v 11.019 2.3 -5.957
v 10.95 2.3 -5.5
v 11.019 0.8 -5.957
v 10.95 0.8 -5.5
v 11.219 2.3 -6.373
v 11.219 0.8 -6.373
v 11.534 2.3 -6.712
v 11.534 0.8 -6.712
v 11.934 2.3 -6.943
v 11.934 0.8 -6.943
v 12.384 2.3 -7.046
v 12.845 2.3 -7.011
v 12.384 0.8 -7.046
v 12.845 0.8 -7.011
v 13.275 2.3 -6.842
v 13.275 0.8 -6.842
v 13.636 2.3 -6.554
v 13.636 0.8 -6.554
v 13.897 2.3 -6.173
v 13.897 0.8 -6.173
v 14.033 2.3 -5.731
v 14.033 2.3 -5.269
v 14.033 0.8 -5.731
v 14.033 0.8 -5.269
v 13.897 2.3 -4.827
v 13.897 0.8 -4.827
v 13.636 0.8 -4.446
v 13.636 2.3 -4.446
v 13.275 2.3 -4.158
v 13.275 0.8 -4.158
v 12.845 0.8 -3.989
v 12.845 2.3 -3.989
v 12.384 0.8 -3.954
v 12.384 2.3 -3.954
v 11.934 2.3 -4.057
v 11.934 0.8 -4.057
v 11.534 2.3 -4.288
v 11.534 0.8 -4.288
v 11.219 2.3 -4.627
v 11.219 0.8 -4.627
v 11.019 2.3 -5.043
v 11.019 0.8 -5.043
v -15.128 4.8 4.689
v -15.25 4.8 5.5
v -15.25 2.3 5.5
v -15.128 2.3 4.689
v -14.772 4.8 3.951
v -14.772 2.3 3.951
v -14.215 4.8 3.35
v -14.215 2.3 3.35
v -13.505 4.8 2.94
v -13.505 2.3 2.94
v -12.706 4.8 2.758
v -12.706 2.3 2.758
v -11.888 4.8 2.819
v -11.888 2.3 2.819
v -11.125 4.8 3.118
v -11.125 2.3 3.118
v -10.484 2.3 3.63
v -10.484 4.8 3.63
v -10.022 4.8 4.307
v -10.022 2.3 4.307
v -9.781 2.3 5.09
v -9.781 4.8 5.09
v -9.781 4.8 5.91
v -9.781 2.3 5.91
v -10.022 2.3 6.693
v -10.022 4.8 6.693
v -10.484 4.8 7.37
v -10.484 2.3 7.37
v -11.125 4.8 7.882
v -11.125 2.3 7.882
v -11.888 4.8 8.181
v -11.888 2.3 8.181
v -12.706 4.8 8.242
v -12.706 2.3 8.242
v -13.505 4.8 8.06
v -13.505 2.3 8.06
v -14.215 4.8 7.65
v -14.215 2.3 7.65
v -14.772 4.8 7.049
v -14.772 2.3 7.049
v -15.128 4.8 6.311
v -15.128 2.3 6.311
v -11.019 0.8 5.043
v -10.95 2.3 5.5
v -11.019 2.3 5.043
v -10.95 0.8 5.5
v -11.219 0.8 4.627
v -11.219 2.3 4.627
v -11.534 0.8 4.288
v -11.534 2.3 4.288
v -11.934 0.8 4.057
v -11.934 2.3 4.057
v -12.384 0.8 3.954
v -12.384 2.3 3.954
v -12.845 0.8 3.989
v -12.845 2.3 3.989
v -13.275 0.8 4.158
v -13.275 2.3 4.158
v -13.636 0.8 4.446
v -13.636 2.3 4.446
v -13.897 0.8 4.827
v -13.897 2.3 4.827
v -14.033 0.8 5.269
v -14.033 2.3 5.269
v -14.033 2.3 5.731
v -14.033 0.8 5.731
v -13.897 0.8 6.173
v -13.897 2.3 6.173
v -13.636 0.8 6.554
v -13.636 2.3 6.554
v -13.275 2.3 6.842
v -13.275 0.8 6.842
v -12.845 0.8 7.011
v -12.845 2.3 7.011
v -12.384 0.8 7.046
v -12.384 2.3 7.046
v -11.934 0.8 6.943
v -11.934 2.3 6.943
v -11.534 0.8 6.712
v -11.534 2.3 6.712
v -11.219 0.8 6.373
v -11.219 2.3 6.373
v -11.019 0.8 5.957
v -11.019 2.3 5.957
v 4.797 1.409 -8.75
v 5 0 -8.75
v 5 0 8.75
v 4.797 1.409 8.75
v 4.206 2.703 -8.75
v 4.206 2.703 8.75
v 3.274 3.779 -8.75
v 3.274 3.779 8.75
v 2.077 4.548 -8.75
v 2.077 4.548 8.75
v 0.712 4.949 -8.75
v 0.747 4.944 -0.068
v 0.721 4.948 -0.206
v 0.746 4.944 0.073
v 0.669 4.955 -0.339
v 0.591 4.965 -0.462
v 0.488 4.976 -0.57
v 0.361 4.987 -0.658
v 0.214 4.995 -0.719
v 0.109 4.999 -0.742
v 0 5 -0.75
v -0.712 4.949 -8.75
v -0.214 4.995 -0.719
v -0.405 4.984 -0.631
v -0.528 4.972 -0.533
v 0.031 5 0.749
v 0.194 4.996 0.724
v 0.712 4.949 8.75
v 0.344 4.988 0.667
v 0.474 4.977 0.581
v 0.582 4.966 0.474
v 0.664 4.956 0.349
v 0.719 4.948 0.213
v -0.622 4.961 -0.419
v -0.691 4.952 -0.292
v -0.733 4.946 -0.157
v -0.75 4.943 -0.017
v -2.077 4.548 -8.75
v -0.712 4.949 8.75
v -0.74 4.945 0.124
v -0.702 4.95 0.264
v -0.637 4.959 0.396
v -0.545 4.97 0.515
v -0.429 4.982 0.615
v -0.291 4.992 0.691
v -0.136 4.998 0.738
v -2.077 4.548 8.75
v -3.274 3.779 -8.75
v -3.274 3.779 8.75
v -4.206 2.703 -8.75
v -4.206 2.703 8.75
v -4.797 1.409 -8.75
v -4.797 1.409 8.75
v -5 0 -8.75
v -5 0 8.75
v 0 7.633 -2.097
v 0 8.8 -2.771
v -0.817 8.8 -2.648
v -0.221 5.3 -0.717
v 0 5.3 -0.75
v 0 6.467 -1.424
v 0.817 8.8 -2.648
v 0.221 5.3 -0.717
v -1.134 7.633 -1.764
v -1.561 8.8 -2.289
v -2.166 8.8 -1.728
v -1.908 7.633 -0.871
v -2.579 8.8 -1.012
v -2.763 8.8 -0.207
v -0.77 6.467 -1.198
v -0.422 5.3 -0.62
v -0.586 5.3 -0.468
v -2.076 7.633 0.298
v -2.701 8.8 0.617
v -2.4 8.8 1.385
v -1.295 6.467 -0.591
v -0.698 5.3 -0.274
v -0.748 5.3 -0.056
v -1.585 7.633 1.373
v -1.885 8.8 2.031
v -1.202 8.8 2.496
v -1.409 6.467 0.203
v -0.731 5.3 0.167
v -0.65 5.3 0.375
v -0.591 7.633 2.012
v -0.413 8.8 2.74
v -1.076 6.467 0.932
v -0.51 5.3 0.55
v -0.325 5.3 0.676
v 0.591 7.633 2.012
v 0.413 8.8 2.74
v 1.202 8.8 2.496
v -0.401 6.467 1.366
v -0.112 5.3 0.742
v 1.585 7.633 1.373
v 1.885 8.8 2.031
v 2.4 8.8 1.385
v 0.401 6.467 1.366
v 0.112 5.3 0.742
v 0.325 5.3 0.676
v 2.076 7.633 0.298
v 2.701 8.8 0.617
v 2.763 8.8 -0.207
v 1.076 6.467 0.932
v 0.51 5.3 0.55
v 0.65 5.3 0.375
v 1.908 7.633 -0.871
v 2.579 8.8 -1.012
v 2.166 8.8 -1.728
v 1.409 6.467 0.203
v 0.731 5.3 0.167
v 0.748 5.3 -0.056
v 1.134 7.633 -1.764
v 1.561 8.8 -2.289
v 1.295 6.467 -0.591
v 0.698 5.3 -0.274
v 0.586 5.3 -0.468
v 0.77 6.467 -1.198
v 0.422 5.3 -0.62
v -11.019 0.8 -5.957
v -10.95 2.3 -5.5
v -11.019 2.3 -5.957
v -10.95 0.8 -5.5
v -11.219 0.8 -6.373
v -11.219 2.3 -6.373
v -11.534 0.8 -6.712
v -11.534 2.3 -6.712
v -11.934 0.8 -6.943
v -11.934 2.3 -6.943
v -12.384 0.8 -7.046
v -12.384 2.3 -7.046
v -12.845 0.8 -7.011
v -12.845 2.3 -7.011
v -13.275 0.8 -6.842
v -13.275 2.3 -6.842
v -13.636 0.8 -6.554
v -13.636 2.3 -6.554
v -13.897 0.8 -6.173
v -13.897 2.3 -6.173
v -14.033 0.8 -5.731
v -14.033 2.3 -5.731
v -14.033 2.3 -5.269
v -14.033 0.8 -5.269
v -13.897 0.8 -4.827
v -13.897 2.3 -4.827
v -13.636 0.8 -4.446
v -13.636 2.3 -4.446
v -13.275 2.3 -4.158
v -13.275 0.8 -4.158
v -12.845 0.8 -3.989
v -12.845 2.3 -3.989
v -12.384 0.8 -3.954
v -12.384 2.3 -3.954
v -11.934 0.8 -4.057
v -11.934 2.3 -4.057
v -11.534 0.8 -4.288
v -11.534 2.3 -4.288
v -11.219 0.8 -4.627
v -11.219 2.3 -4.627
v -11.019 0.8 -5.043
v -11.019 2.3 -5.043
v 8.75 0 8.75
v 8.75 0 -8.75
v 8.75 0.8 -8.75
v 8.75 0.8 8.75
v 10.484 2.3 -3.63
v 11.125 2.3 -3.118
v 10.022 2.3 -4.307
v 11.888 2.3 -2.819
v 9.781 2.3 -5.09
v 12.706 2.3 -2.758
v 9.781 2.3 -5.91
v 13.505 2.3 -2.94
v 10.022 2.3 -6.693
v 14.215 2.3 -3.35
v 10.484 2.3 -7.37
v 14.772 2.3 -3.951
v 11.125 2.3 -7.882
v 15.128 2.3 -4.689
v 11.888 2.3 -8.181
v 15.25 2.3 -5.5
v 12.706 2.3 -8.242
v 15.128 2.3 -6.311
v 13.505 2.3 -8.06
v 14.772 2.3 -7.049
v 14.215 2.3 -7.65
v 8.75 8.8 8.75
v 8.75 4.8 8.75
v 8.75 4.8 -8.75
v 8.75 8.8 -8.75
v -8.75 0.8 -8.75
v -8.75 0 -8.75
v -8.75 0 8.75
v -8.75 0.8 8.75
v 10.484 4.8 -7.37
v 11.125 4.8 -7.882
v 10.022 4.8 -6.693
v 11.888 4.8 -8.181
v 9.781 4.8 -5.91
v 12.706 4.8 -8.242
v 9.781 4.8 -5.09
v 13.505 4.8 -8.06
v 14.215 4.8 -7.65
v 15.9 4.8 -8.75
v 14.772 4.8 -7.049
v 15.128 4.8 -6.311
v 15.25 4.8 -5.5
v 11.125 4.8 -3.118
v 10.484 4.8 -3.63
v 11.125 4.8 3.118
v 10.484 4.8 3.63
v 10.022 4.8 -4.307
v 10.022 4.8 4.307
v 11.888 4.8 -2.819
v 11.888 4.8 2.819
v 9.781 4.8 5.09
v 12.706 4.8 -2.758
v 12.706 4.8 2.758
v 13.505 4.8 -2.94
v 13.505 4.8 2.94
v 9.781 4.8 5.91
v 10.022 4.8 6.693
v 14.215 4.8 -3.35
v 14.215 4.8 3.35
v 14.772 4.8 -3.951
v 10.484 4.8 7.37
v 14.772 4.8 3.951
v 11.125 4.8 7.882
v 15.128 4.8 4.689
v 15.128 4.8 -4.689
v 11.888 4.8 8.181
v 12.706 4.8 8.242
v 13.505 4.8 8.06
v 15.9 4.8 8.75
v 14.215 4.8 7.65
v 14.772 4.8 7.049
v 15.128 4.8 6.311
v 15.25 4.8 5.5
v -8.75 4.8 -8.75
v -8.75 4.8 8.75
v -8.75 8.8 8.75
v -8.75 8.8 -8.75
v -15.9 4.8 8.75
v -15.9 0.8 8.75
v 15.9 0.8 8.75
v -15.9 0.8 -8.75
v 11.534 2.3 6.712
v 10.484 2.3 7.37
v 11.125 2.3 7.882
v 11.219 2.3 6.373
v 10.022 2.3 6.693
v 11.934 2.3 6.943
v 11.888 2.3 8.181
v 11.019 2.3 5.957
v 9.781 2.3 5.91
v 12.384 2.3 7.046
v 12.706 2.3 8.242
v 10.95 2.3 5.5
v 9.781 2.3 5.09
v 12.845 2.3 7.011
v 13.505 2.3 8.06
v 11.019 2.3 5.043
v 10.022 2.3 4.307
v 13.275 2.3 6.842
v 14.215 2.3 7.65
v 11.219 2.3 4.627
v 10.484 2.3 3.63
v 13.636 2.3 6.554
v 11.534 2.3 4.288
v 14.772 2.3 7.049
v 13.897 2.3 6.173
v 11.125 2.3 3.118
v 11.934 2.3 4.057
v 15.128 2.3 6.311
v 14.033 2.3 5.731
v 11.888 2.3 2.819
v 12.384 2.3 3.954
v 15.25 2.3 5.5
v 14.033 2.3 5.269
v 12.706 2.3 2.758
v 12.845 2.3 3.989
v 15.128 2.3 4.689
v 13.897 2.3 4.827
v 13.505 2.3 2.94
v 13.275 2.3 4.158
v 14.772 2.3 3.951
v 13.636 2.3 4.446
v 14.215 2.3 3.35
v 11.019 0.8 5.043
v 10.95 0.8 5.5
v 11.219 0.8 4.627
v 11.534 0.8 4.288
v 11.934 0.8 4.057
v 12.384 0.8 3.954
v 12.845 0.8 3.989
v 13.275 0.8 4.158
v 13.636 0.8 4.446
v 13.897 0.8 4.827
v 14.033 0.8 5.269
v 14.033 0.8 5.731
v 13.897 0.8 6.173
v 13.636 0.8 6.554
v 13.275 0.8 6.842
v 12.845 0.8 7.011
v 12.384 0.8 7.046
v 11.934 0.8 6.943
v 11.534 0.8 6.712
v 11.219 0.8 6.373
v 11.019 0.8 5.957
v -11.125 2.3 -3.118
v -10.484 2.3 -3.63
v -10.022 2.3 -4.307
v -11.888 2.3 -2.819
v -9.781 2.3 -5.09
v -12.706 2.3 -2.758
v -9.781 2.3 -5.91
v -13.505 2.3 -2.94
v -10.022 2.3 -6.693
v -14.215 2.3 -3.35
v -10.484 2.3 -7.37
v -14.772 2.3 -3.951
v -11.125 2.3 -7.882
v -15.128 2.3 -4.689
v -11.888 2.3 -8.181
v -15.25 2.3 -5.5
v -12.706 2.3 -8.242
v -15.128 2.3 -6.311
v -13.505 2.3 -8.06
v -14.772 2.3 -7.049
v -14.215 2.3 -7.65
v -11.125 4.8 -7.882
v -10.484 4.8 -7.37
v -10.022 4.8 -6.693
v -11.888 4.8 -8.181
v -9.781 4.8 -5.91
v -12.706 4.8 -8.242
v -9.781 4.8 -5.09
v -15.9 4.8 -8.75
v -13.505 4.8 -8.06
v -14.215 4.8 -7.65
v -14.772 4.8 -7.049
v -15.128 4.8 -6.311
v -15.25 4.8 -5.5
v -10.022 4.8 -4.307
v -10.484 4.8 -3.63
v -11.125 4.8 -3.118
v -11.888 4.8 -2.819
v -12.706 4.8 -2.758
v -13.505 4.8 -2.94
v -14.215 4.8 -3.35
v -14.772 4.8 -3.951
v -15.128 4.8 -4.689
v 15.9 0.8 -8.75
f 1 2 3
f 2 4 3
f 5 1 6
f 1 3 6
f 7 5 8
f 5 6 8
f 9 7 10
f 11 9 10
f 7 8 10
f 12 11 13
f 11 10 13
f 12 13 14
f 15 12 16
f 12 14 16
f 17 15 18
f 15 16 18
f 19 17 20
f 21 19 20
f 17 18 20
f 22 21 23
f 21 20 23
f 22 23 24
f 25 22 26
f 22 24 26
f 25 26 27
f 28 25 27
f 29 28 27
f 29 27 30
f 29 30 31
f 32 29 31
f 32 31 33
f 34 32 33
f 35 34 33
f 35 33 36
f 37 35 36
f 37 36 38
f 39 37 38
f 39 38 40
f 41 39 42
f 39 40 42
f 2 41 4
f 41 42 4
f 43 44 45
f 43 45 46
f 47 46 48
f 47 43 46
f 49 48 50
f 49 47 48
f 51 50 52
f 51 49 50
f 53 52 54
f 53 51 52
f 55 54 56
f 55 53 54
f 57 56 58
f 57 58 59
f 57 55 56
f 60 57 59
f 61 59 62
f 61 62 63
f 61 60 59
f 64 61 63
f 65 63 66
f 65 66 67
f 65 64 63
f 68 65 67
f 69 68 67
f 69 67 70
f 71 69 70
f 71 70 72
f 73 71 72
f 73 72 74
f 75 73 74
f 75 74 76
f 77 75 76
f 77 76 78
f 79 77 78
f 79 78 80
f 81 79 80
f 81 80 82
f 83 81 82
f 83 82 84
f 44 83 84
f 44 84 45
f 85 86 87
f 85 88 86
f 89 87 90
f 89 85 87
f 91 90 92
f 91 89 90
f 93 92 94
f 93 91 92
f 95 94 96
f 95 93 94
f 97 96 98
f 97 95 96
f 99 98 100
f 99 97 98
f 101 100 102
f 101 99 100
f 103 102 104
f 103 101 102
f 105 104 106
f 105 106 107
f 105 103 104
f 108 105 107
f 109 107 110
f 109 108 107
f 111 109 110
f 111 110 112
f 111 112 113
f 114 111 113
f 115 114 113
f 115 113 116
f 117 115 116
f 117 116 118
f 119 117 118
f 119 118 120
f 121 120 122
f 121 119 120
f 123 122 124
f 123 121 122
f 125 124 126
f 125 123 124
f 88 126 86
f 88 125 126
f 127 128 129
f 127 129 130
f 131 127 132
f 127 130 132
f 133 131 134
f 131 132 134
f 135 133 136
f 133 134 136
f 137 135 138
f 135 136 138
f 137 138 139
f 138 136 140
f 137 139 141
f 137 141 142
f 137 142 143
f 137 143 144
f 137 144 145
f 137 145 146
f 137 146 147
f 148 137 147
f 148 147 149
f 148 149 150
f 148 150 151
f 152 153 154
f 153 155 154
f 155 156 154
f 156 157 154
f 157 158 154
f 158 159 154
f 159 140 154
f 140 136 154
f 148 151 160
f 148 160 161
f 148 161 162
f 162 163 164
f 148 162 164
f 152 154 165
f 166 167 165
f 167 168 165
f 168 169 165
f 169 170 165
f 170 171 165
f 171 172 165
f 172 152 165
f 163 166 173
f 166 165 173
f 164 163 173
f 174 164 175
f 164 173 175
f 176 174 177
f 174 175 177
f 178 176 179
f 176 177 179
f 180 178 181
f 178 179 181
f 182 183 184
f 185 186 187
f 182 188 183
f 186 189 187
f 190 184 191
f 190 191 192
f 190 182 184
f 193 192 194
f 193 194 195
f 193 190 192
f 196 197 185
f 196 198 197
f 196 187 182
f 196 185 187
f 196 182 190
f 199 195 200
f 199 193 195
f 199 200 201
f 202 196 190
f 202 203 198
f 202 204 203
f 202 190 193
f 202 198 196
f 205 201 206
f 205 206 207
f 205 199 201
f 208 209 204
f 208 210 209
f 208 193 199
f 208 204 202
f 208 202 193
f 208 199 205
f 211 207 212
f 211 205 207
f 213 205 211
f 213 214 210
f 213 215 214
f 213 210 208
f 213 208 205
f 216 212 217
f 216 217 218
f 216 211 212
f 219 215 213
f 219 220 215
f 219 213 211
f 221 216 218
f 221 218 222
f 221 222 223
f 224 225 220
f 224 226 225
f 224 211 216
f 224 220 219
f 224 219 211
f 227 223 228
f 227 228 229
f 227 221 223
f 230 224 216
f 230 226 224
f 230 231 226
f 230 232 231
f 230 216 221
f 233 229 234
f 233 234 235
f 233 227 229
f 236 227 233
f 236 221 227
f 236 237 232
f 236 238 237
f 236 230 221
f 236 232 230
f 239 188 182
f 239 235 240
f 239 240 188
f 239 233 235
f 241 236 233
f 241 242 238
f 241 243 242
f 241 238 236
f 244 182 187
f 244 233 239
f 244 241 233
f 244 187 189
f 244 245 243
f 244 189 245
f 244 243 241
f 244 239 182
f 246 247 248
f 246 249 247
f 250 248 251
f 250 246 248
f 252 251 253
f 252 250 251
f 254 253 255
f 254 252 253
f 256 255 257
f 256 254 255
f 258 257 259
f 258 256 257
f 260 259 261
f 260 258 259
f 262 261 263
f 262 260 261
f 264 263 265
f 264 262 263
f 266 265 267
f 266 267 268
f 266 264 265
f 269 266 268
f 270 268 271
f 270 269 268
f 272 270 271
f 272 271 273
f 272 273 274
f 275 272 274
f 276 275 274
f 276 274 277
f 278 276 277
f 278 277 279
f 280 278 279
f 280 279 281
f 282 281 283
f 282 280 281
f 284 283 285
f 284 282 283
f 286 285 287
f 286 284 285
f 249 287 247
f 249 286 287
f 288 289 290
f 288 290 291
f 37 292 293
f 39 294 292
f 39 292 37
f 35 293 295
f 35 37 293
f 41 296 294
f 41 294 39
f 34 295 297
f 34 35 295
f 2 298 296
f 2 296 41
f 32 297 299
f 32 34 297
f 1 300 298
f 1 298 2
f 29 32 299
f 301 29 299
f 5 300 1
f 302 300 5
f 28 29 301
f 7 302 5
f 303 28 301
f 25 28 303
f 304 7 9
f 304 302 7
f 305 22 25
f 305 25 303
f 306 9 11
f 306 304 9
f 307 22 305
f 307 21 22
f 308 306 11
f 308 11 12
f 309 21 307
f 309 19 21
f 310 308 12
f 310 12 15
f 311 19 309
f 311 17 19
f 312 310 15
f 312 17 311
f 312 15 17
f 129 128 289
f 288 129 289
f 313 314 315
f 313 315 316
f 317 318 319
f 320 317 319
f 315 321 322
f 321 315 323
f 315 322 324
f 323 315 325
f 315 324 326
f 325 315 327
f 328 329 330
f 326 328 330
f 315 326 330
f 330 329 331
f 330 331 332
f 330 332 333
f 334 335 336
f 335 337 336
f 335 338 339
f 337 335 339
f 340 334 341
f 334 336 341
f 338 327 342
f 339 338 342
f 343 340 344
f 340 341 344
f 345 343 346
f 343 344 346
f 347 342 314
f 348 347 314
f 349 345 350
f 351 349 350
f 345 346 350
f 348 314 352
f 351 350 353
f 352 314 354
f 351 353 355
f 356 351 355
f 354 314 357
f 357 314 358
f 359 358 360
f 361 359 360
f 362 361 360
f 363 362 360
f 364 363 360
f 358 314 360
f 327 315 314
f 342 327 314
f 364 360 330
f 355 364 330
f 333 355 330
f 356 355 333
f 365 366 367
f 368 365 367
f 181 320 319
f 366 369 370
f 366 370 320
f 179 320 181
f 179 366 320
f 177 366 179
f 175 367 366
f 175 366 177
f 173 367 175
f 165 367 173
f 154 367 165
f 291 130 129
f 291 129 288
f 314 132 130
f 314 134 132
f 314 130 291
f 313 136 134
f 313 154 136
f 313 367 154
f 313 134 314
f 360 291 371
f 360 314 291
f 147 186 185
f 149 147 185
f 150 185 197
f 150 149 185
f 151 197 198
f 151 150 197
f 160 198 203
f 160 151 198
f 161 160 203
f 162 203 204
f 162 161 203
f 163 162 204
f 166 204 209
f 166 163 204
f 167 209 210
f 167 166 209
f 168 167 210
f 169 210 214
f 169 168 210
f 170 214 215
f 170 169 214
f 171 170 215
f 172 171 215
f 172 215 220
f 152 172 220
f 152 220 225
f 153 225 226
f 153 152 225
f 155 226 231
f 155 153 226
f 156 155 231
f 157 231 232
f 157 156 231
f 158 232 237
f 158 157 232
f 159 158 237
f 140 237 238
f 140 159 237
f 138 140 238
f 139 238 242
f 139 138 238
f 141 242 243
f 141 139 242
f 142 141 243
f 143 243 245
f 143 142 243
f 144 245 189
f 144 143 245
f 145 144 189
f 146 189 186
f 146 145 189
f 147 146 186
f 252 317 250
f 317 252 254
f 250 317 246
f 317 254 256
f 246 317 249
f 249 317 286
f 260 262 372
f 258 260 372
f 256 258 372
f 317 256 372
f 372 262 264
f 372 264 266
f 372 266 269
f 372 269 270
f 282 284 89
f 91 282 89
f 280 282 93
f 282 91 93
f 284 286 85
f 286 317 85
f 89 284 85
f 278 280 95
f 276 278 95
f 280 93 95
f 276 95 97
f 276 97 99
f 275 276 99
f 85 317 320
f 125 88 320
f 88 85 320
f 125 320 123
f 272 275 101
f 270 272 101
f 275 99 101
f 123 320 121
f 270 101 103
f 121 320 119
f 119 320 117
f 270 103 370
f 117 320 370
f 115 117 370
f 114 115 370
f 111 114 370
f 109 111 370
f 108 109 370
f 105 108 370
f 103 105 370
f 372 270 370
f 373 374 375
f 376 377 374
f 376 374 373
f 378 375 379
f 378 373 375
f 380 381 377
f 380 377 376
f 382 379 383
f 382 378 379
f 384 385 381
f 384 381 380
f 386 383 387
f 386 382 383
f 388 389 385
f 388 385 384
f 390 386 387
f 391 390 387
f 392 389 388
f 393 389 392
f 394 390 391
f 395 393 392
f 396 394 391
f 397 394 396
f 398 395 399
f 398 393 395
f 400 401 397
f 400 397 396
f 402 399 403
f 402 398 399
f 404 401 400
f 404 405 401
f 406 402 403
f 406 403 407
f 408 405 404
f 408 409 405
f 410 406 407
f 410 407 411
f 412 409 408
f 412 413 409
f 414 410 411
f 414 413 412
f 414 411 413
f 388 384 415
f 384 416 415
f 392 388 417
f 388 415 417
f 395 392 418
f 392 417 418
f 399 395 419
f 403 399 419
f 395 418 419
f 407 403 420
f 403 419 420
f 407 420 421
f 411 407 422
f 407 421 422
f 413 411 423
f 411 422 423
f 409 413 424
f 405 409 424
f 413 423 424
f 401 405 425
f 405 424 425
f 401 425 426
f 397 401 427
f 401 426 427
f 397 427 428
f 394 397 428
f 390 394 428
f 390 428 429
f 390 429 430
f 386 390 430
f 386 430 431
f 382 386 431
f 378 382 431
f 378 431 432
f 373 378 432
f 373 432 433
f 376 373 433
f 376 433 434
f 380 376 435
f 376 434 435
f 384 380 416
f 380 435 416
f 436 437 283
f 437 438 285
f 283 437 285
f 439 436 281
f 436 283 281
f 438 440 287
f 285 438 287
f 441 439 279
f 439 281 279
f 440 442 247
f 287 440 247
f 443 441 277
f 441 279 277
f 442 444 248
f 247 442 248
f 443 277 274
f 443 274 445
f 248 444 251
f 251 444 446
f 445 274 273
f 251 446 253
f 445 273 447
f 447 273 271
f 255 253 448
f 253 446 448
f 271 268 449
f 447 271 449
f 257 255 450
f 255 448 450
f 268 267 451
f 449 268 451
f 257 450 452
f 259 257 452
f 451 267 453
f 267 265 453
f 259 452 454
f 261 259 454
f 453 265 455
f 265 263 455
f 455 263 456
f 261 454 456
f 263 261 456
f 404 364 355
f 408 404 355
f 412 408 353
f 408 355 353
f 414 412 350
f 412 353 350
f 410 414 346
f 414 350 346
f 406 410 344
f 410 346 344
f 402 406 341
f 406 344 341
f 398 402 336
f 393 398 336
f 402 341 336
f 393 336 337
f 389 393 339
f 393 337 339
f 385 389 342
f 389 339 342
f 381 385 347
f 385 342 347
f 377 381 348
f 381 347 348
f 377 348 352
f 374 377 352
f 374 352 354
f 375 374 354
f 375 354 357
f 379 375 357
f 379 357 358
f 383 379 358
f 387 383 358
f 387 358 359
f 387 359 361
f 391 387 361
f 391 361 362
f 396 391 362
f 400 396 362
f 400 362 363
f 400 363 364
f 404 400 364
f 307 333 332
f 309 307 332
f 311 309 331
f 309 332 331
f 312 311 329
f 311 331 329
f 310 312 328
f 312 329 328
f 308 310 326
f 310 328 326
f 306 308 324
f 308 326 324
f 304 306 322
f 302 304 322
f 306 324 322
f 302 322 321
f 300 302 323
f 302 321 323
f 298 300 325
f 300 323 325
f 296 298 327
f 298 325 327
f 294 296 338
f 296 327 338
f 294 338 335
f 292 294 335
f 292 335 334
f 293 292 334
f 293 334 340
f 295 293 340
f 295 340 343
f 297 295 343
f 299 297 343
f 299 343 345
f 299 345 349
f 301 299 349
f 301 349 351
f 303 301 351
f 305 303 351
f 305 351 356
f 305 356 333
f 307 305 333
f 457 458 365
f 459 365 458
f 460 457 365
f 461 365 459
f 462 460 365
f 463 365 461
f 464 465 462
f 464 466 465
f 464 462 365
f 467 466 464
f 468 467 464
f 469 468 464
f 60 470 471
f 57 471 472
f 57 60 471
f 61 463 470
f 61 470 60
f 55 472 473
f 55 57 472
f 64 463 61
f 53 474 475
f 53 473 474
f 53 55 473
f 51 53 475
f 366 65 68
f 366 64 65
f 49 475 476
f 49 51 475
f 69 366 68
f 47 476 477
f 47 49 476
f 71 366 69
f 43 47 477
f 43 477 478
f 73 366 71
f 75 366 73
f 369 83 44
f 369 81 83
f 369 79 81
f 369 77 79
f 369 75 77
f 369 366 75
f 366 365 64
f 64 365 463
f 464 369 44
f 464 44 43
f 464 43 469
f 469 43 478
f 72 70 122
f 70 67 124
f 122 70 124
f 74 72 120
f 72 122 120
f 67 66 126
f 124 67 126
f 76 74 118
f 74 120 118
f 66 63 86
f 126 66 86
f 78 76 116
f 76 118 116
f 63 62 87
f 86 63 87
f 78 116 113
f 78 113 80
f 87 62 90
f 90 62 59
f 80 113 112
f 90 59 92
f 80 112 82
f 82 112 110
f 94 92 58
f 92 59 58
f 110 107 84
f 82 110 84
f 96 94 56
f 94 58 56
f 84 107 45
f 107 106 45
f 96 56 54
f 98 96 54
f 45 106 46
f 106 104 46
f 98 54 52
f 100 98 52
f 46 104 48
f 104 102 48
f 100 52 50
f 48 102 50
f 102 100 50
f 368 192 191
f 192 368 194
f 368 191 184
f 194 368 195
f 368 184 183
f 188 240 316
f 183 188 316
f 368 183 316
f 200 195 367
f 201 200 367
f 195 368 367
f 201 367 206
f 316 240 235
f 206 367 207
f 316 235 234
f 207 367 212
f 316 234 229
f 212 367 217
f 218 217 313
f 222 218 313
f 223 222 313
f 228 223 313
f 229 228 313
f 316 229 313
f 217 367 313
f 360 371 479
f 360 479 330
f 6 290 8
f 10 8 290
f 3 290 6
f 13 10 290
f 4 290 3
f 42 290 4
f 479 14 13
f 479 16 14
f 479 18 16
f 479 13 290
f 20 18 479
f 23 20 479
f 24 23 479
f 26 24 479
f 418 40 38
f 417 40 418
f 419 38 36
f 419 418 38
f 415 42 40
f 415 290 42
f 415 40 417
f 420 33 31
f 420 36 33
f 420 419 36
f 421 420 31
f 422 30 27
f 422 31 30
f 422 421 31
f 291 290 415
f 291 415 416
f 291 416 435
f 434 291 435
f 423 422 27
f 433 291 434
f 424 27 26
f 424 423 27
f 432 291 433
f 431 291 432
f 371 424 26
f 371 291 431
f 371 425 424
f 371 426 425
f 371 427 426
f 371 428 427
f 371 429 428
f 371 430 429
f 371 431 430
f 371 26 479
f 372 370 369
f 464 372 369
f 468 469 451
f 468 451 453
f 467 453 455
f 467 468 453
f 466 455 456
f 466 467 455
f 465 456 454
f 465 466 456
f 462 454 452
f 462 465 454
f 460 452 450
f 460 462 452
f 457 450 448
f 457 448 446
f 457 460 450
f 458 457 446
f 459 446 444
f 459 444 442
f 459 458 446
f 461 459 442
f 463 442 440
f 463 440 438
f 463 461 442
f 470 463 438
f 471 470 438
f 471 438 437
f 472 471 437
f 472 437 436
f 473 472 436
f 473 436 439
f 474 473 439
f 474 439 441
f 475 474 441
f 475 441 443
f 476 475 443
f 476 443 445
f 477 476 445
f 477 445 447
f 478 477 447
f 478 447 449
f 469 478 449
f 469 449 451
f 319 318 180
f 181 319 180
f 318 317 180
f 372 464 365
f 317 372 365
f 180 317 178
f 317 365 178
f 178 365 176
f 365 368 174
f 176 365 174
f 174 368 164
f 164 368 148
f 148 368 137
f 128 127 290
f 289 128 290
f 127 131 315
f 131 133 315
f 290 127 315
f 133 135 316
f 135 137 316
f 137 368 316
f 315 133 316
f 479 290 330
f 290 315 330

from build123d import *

# Parameters (mm, degrees)
SZKIC1_W                                          = 31.8
SZKIC1_H                                          = 8.8
DODANIE_WYCI_GNI_CIE1_DEPTH                       = 8.75
SZKIC2_W                                          = 7.15
SZKIC2_H                                          = 17.5
WYTNIJ_WYCI_GNI_CIE1_DEPTH                        = 0.8
SZKIC3_W                                          = 7.15
SZKIC3_H                                          = 4
WYTNIJ_WYCI_GNI_CIE2_DEPTH                        = 26.228951623
POG_BIENIE_WALCOWE_POD_M2_5_RUB_Z_BEM_D           = 3.1
POG_BIENIE_WALCOWE_POD_M2_5_RUB_Z_BEM_CBORE_D     = 5.5
POG_BIENIE_WALCOWE_POD_M2_5_RUB_Z_BEM_CBORE_DEPTH = 2.5
SZKIC6_R                                          = 5
WYTNIJ_WYCI_GNI_CIE3_DEPTH                        = 26.228951623


with BuildPart() as part:
    # Szkic1 → Dodanie-wyciągnięcie1 (new, symmetric)
    with BuildSketch(Plane.XY):
        with Locations((0, 4.4)):
            Rectangle(SZKIC1_W, SZKIC1_H)
    extrude(amount=DODANIE_WYCI_GNI_CIE1_DEPTH, both=True)

    # Szkic2 → Wytnij-wyciągnięcie1 (cut)
    with BuildSketch(Plane.XZ):
        with Locations((12.325, 0)):
            Rectangle(SZKIC2_W, SZKIC2_H)
    wytnij_wyci_gni_cie1 = extrude(amount=-WYTNIJ_WYCI_GNI_CIE1_DEPTH, mode=Mode.SUBTRACT)

    # Szkic3 → Wytnij-wyciągnięcie2 (cut, through all)
    with BuildSketch(Plane.XY.offset(8.75)):
        with Locations((12.325, 6.8)):
            Rectangle(SZKIC3_W, SZKIC3_H)
    wytnij_wyci_gni_cie2 = extrude(amount=-WYTNIJ_WYCI_GNI_CIE2_DEPTH, mode=Mode.SUBTRACT)

    # Pogłębienie walcowe pod M2.5 Śrubę z łbem walcowym z gniazdem1 (through all)
    with Locations(Plane(origin=(0, 4.8, 0), x_dir=(1, 0, 0), z_dir=(0, 1, 0))):
        with Locations((12.5, 5.5), (12.5, -5.5)):
            pog_bienie_walcowe_pod_m2_5_rub_z_bem = CounterBoreHole(POG_BIENIE_WALCOWE_POD_M2_5_RUB_Z_BEM_D / 2, POG_BIENIE_WALCOWE_POD_M2_5_RUB_Z_BEM_CBORE_D / 2, POG_BIENIE_WALCOWE_POD_M2_5_RUB_Z_BEM_CBORE_DEPTH)

    # Lustro1: Wytnij-wyciągnięcie1, Wytnij-wyciągnięcie2, Pogłębienie walcowe pod M2.5 Śrubę z łbem walcowym z gniazdem1 across plane
    add(wytnij_wyci_gni_cie1.mirror(Plane(origin=(0, 0, 0), x_dir=(0, 0, 1), z_dir=(1, 0, 0))), mode=Mode.SUBTRACT)
    add(wytnij_wyci_gni_cie2.mirror(Plane(origin=(0, 0, 0), x_dir=(0, 0, 1), z_dir=(1, 0, 0))), mode=Mode.SUBTRACT)
    add(pog_bienie_walcowe_pod_m2_5_rub_z_bem.mirror(Plane(origin=(0, 0, 0), x_dir=(0, 0, 1), z_dir=(1, 0, 0))), mode=Mode.SUBTRACT)

    # Szkic6 → Wytnij-wyciągnięcie3 (cut, through all)
    with BuildSketch(Plane.XY.offset(8.75)):
        Circle(SZKIC6_R)
    extrude(amount=-WYTNIJ_WYCI_GNI_CIE3_DEPTH, mode=Mode.SUBTRACT)

    # Szkic7 → Wycięcie-obrót5 (revolve, cut)
    with BuildSketch(Plane.XY, mode=Mode.PRIVATE) as wyci_cie_obr_t5_sk:
        Polygon((0, 0), (0, 8.8), (2.770725942, 8.8), (0.75, 5.3), (0.75, 0), align=None)
    revolve(wyci_cie_obr_t5_sk.sketch.rotate(Axis((0, 0, 0), (0, 1, 0)), 90), axis=Axis((0, 0, 0), (0, 1, 0)), mode=Mode.SUBTRACT)


solid = part.part
